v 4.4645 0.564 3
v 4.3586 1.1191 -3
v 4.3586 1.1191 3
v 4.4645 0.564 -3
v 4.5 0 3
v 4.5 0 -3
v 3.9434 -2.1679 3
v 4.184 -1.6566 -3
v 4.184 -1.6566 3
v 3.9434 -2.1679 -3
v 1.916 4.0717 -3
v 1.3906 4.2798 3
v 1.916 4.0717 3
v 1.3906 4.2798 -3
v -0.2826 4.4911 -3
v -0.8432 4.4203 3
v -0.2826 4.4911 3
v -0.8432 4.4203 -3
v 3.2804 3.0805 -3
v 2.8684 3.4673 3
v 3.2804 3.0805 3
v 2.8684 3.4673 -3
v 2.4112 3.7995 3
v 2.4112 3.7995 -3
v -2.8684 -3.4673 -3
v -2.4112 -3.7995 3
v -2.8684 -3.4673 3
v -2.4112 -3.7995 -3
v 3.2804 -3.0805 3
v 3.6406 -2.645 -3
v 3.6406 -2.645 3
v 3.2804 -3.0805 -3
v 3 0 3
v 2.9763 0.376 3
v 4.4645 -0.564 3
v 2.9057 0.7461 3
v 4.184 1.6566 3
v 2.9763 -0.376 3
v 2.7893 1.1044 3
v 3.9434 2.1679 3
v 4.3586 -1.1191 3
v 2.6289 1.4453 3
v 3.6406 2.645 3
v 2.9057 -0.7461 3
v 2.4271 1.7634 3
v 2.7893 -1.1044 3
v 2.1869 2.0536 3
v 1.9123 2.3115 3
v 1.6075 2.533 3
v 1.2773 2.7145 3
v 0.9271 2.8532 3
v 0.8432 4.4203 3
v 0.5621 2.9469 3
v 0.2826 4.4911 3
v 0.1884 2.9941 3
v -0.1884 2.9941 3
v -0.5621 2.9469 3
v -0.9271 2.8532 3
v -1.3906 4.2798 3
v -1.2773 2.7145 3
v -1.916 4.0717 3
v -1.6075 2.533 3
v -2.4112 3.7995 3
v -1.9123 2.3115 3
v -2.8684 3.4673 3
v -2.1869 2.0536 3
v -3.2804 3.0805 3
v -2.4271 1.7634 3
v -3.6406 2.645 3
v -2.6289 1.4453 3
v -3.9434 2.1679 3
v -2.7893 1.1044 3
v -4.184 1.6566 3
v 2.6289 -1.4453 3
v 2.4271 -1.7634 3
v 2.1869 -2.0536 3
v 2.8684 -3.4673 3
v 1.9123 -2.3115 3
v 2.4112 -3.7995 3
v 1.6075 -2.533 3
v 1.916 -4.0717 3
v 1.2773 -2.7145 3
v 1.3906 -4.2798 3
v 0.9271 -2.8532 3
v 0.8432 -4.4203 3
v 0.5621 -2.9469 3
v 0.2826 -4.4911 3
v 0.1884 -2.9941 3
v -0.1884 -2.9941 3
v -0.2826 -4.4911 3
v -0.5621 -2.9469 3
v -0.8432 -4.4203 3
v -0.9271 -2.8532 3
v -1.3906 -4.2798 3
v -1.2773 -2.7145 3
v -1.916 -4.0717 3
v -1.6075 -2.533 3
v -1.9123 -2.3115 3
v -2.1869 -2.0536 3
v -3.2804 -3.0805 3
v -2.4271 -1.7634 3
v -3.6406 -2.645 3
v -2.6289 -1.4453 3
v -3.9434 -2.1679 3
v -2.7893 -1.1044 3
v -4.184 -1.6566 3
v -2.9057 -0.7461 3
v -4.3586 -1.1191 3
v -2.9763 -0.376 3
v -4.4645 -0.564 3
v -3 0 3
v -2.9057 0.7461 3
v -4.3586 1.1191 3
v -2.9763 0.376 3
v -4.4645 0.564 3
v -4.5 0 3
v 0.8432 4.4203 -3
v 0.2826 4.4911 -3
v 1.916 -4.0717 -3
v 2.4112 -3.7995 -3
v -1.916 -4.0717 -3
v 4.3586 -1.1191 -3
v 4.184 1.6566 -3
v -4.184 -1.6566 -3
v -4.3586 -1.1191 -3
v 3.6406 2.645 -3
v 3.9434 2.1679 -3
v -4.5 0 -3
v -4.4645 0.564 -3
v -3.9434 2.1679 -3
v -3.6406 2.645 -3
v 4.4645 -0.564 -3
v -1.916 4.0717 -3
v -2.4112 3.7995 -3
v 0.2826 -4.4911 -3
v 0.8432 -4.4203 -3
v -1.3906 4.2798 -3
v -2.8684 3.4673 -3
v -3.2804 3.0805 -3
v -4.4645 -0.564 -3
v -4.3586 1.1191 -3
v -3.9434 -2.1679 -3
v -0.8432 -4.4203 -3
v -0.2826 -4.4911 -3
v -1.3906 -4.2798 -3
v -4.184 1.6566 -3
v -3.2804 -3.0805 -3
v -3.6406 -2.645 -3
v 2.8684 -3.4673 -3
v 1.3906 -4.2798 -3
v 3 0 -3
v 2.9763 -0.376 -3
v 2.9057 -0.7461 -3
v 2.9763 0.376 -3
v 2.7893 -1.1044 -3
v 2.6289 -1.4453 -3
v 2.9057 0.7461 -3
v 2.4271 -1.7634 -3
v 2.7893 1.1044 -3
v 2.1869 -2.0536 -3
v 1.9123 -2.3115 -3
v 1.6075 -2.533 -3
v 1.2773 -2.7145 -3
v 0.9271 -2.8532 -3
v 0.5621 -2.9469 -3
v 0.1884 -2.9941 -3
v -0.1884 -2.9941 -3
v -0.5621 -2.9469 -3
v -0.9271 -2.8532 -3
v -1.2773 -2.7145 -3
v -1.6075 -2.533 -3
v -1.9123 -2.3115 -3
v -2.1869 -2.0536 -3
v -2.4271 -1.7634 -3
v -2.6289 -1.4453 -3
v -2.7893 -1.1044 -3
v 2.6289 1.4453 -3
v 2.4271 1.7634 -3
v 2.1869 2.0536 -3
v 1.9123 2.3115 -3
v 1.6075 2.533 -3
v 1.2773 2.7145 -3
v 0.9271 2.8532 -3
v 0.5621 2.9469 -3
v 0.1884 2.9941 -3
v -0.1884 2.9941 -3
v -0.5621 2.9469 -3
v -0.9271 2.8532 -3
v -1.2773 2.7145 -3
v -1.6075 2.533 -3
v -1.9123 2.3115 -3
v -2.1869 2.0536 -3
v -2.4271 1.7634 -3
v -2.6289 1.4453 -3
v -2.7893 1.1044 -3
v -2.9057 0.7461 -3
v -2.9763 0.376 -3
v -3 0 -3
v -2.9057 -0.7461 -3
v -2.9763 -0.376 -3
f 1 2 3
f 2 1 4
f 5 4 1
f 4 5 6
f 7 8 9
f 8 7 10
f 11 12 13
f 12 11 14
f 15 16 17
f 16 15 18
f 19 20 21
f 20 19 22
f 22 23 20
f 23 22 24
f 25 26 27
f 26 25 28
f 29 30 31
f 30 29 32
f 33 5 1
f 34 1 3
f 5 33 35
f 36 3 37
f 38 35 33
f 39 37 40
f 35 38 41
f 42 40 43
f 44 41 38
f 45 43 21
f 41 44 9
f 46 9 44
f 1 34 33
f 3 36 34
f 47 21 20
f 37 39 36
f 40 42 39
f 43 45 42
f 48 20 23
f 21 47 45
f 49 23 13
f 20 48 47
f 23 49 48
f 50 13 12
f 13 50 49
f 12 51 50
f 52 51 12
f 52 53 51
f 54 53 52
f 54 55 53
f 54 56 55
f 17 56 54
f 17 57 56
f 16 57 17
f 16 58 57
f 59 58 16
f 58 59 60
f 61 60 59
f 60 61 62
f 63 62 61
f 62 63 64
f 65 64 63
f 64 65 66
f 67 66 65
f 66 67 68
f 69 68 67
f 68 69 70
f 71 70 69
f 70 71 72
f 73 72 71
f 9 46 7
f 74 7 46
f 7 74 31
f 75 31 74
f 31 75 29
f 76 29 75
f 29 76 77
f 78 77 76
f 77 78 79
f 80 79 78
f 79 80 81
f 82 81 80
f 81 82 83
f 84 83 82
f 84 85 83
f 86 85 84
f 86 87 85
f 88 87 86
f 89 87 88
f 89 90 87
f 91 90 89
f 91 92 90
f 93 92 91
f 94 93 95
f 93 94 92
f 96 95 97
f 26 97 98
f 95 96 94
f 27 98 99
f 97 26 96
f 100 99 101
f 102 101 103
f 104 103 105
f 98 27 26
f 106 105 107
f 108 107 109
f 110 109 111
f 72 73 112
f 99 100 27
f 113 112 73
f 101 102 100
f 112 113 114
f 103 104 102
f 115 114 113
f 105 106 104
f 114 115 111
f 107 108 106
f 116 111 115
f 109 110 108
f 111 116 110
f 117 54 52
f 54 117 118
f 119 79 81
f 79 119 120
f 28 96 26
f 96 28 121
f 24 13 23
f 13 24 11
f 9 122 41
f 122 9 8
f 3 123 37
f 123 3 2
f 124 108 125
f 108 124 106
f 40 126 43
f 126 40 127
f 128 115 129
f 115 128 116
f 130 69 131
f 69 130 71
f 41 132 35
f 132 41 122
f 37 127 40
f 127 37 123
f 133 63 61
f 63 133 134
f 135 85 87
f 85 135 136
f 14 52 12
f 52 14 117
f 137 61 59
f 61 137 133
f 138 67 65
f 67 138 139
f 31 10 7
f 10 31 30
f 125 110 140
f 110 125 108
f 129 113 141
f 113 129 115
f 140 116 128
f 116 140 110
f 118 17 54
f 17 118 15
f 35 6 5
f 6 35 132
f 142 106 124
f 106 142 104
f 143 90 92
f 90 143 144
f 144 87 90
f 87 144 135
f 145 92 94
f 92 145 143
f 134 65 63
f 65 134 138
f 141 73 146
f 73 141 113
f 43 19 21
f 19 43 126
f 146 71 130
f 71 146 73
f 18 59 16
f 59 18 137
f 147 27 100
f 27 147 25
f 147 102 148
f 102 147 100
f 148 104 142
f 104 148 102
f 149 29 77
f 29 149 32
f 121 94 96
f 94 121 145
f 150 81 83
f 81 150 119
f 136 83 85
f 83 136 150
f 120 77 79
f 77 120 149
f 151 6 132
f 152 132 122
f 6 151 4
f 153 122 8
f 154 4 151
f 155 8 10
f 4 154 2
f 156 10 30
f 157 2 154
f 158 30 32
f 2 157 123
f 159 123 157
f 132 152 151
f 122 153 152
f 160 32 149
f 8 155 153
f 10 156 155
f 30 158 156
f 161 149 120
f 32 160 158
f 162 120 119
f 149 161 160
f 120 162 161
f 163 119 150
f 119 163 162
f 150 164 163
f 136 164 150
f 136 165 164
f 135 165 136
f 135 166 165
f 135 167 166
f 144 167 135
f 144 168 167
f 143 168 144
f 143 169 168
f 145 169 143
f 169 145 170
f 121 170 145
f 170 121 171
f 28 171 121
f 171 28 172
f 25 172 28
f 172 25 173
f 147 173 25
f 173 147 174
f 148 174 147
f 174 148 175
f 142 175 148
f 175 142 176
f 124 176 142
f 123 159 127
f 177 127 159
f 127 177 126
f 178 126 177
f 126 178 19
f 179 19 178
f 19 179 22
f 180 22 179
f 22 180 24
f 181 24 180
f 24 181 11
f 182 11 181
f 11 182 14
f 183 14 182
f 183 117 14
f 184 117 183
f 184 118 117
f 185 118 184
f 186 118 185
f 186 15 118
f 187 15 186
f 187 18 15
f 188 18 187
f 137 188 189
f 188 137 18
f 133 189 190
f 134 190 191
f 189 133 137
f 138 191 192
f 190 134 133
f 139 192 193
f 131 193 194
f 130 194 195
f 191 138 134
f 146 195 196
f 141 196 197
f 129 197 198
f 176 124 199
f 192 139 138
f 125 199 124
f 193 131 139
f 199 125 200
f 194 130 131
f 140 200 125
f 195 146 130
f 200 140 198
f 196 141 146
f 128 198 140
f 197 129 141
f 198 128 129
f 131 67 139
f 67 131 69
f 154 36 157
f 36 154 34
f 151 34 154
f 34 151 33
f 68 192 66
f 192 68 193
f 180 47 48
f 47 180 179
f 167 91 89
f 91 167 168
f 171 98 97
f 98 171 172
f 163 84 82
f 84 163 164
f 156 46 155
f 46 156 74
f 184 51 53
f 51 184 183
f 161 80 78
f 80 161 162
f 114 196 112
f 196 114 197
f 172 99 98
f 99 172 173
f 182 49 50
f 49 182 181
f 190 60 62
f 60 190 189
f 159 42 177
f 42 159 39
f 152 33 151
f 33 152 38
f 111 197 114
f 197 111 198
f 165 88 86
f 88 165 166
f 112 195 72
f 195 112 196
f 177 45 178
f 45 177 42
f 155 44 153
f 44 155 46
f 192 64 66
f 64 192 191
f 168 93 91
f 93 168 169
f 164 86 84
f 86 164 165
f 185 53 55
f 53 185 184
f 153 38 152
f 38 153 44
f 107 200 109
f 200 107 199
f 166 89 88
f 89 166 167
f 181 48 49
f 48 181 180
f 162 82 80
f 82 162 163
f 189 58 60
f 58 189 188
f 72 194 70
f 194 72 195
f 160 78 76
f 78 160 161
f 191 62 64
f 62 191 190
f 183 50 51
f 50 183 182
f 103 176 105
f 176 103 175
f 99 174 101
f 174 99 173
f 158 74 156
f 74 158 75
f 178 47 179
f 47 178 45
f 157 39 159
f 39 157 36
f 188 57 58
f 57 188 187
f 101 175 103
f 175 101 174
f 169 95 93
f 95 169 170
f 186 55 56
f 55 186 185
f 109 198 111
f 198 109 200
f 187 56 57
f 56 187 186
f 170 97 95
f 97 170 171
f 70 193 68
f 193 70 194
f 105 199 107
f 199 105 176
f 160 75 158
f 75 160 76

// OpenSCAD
$fn = 50;


difference() {
	union() {
		translate(v = [0, 0, -3.0000000000]) {
			cylinder(h = 6, r = 4.5000000000);
		}
	}
	union() {
		translate(v = [0, 0, -100.0000000000]) {
			cylinder(h = 200, r = 3.0000000000);
		}
	}
}
